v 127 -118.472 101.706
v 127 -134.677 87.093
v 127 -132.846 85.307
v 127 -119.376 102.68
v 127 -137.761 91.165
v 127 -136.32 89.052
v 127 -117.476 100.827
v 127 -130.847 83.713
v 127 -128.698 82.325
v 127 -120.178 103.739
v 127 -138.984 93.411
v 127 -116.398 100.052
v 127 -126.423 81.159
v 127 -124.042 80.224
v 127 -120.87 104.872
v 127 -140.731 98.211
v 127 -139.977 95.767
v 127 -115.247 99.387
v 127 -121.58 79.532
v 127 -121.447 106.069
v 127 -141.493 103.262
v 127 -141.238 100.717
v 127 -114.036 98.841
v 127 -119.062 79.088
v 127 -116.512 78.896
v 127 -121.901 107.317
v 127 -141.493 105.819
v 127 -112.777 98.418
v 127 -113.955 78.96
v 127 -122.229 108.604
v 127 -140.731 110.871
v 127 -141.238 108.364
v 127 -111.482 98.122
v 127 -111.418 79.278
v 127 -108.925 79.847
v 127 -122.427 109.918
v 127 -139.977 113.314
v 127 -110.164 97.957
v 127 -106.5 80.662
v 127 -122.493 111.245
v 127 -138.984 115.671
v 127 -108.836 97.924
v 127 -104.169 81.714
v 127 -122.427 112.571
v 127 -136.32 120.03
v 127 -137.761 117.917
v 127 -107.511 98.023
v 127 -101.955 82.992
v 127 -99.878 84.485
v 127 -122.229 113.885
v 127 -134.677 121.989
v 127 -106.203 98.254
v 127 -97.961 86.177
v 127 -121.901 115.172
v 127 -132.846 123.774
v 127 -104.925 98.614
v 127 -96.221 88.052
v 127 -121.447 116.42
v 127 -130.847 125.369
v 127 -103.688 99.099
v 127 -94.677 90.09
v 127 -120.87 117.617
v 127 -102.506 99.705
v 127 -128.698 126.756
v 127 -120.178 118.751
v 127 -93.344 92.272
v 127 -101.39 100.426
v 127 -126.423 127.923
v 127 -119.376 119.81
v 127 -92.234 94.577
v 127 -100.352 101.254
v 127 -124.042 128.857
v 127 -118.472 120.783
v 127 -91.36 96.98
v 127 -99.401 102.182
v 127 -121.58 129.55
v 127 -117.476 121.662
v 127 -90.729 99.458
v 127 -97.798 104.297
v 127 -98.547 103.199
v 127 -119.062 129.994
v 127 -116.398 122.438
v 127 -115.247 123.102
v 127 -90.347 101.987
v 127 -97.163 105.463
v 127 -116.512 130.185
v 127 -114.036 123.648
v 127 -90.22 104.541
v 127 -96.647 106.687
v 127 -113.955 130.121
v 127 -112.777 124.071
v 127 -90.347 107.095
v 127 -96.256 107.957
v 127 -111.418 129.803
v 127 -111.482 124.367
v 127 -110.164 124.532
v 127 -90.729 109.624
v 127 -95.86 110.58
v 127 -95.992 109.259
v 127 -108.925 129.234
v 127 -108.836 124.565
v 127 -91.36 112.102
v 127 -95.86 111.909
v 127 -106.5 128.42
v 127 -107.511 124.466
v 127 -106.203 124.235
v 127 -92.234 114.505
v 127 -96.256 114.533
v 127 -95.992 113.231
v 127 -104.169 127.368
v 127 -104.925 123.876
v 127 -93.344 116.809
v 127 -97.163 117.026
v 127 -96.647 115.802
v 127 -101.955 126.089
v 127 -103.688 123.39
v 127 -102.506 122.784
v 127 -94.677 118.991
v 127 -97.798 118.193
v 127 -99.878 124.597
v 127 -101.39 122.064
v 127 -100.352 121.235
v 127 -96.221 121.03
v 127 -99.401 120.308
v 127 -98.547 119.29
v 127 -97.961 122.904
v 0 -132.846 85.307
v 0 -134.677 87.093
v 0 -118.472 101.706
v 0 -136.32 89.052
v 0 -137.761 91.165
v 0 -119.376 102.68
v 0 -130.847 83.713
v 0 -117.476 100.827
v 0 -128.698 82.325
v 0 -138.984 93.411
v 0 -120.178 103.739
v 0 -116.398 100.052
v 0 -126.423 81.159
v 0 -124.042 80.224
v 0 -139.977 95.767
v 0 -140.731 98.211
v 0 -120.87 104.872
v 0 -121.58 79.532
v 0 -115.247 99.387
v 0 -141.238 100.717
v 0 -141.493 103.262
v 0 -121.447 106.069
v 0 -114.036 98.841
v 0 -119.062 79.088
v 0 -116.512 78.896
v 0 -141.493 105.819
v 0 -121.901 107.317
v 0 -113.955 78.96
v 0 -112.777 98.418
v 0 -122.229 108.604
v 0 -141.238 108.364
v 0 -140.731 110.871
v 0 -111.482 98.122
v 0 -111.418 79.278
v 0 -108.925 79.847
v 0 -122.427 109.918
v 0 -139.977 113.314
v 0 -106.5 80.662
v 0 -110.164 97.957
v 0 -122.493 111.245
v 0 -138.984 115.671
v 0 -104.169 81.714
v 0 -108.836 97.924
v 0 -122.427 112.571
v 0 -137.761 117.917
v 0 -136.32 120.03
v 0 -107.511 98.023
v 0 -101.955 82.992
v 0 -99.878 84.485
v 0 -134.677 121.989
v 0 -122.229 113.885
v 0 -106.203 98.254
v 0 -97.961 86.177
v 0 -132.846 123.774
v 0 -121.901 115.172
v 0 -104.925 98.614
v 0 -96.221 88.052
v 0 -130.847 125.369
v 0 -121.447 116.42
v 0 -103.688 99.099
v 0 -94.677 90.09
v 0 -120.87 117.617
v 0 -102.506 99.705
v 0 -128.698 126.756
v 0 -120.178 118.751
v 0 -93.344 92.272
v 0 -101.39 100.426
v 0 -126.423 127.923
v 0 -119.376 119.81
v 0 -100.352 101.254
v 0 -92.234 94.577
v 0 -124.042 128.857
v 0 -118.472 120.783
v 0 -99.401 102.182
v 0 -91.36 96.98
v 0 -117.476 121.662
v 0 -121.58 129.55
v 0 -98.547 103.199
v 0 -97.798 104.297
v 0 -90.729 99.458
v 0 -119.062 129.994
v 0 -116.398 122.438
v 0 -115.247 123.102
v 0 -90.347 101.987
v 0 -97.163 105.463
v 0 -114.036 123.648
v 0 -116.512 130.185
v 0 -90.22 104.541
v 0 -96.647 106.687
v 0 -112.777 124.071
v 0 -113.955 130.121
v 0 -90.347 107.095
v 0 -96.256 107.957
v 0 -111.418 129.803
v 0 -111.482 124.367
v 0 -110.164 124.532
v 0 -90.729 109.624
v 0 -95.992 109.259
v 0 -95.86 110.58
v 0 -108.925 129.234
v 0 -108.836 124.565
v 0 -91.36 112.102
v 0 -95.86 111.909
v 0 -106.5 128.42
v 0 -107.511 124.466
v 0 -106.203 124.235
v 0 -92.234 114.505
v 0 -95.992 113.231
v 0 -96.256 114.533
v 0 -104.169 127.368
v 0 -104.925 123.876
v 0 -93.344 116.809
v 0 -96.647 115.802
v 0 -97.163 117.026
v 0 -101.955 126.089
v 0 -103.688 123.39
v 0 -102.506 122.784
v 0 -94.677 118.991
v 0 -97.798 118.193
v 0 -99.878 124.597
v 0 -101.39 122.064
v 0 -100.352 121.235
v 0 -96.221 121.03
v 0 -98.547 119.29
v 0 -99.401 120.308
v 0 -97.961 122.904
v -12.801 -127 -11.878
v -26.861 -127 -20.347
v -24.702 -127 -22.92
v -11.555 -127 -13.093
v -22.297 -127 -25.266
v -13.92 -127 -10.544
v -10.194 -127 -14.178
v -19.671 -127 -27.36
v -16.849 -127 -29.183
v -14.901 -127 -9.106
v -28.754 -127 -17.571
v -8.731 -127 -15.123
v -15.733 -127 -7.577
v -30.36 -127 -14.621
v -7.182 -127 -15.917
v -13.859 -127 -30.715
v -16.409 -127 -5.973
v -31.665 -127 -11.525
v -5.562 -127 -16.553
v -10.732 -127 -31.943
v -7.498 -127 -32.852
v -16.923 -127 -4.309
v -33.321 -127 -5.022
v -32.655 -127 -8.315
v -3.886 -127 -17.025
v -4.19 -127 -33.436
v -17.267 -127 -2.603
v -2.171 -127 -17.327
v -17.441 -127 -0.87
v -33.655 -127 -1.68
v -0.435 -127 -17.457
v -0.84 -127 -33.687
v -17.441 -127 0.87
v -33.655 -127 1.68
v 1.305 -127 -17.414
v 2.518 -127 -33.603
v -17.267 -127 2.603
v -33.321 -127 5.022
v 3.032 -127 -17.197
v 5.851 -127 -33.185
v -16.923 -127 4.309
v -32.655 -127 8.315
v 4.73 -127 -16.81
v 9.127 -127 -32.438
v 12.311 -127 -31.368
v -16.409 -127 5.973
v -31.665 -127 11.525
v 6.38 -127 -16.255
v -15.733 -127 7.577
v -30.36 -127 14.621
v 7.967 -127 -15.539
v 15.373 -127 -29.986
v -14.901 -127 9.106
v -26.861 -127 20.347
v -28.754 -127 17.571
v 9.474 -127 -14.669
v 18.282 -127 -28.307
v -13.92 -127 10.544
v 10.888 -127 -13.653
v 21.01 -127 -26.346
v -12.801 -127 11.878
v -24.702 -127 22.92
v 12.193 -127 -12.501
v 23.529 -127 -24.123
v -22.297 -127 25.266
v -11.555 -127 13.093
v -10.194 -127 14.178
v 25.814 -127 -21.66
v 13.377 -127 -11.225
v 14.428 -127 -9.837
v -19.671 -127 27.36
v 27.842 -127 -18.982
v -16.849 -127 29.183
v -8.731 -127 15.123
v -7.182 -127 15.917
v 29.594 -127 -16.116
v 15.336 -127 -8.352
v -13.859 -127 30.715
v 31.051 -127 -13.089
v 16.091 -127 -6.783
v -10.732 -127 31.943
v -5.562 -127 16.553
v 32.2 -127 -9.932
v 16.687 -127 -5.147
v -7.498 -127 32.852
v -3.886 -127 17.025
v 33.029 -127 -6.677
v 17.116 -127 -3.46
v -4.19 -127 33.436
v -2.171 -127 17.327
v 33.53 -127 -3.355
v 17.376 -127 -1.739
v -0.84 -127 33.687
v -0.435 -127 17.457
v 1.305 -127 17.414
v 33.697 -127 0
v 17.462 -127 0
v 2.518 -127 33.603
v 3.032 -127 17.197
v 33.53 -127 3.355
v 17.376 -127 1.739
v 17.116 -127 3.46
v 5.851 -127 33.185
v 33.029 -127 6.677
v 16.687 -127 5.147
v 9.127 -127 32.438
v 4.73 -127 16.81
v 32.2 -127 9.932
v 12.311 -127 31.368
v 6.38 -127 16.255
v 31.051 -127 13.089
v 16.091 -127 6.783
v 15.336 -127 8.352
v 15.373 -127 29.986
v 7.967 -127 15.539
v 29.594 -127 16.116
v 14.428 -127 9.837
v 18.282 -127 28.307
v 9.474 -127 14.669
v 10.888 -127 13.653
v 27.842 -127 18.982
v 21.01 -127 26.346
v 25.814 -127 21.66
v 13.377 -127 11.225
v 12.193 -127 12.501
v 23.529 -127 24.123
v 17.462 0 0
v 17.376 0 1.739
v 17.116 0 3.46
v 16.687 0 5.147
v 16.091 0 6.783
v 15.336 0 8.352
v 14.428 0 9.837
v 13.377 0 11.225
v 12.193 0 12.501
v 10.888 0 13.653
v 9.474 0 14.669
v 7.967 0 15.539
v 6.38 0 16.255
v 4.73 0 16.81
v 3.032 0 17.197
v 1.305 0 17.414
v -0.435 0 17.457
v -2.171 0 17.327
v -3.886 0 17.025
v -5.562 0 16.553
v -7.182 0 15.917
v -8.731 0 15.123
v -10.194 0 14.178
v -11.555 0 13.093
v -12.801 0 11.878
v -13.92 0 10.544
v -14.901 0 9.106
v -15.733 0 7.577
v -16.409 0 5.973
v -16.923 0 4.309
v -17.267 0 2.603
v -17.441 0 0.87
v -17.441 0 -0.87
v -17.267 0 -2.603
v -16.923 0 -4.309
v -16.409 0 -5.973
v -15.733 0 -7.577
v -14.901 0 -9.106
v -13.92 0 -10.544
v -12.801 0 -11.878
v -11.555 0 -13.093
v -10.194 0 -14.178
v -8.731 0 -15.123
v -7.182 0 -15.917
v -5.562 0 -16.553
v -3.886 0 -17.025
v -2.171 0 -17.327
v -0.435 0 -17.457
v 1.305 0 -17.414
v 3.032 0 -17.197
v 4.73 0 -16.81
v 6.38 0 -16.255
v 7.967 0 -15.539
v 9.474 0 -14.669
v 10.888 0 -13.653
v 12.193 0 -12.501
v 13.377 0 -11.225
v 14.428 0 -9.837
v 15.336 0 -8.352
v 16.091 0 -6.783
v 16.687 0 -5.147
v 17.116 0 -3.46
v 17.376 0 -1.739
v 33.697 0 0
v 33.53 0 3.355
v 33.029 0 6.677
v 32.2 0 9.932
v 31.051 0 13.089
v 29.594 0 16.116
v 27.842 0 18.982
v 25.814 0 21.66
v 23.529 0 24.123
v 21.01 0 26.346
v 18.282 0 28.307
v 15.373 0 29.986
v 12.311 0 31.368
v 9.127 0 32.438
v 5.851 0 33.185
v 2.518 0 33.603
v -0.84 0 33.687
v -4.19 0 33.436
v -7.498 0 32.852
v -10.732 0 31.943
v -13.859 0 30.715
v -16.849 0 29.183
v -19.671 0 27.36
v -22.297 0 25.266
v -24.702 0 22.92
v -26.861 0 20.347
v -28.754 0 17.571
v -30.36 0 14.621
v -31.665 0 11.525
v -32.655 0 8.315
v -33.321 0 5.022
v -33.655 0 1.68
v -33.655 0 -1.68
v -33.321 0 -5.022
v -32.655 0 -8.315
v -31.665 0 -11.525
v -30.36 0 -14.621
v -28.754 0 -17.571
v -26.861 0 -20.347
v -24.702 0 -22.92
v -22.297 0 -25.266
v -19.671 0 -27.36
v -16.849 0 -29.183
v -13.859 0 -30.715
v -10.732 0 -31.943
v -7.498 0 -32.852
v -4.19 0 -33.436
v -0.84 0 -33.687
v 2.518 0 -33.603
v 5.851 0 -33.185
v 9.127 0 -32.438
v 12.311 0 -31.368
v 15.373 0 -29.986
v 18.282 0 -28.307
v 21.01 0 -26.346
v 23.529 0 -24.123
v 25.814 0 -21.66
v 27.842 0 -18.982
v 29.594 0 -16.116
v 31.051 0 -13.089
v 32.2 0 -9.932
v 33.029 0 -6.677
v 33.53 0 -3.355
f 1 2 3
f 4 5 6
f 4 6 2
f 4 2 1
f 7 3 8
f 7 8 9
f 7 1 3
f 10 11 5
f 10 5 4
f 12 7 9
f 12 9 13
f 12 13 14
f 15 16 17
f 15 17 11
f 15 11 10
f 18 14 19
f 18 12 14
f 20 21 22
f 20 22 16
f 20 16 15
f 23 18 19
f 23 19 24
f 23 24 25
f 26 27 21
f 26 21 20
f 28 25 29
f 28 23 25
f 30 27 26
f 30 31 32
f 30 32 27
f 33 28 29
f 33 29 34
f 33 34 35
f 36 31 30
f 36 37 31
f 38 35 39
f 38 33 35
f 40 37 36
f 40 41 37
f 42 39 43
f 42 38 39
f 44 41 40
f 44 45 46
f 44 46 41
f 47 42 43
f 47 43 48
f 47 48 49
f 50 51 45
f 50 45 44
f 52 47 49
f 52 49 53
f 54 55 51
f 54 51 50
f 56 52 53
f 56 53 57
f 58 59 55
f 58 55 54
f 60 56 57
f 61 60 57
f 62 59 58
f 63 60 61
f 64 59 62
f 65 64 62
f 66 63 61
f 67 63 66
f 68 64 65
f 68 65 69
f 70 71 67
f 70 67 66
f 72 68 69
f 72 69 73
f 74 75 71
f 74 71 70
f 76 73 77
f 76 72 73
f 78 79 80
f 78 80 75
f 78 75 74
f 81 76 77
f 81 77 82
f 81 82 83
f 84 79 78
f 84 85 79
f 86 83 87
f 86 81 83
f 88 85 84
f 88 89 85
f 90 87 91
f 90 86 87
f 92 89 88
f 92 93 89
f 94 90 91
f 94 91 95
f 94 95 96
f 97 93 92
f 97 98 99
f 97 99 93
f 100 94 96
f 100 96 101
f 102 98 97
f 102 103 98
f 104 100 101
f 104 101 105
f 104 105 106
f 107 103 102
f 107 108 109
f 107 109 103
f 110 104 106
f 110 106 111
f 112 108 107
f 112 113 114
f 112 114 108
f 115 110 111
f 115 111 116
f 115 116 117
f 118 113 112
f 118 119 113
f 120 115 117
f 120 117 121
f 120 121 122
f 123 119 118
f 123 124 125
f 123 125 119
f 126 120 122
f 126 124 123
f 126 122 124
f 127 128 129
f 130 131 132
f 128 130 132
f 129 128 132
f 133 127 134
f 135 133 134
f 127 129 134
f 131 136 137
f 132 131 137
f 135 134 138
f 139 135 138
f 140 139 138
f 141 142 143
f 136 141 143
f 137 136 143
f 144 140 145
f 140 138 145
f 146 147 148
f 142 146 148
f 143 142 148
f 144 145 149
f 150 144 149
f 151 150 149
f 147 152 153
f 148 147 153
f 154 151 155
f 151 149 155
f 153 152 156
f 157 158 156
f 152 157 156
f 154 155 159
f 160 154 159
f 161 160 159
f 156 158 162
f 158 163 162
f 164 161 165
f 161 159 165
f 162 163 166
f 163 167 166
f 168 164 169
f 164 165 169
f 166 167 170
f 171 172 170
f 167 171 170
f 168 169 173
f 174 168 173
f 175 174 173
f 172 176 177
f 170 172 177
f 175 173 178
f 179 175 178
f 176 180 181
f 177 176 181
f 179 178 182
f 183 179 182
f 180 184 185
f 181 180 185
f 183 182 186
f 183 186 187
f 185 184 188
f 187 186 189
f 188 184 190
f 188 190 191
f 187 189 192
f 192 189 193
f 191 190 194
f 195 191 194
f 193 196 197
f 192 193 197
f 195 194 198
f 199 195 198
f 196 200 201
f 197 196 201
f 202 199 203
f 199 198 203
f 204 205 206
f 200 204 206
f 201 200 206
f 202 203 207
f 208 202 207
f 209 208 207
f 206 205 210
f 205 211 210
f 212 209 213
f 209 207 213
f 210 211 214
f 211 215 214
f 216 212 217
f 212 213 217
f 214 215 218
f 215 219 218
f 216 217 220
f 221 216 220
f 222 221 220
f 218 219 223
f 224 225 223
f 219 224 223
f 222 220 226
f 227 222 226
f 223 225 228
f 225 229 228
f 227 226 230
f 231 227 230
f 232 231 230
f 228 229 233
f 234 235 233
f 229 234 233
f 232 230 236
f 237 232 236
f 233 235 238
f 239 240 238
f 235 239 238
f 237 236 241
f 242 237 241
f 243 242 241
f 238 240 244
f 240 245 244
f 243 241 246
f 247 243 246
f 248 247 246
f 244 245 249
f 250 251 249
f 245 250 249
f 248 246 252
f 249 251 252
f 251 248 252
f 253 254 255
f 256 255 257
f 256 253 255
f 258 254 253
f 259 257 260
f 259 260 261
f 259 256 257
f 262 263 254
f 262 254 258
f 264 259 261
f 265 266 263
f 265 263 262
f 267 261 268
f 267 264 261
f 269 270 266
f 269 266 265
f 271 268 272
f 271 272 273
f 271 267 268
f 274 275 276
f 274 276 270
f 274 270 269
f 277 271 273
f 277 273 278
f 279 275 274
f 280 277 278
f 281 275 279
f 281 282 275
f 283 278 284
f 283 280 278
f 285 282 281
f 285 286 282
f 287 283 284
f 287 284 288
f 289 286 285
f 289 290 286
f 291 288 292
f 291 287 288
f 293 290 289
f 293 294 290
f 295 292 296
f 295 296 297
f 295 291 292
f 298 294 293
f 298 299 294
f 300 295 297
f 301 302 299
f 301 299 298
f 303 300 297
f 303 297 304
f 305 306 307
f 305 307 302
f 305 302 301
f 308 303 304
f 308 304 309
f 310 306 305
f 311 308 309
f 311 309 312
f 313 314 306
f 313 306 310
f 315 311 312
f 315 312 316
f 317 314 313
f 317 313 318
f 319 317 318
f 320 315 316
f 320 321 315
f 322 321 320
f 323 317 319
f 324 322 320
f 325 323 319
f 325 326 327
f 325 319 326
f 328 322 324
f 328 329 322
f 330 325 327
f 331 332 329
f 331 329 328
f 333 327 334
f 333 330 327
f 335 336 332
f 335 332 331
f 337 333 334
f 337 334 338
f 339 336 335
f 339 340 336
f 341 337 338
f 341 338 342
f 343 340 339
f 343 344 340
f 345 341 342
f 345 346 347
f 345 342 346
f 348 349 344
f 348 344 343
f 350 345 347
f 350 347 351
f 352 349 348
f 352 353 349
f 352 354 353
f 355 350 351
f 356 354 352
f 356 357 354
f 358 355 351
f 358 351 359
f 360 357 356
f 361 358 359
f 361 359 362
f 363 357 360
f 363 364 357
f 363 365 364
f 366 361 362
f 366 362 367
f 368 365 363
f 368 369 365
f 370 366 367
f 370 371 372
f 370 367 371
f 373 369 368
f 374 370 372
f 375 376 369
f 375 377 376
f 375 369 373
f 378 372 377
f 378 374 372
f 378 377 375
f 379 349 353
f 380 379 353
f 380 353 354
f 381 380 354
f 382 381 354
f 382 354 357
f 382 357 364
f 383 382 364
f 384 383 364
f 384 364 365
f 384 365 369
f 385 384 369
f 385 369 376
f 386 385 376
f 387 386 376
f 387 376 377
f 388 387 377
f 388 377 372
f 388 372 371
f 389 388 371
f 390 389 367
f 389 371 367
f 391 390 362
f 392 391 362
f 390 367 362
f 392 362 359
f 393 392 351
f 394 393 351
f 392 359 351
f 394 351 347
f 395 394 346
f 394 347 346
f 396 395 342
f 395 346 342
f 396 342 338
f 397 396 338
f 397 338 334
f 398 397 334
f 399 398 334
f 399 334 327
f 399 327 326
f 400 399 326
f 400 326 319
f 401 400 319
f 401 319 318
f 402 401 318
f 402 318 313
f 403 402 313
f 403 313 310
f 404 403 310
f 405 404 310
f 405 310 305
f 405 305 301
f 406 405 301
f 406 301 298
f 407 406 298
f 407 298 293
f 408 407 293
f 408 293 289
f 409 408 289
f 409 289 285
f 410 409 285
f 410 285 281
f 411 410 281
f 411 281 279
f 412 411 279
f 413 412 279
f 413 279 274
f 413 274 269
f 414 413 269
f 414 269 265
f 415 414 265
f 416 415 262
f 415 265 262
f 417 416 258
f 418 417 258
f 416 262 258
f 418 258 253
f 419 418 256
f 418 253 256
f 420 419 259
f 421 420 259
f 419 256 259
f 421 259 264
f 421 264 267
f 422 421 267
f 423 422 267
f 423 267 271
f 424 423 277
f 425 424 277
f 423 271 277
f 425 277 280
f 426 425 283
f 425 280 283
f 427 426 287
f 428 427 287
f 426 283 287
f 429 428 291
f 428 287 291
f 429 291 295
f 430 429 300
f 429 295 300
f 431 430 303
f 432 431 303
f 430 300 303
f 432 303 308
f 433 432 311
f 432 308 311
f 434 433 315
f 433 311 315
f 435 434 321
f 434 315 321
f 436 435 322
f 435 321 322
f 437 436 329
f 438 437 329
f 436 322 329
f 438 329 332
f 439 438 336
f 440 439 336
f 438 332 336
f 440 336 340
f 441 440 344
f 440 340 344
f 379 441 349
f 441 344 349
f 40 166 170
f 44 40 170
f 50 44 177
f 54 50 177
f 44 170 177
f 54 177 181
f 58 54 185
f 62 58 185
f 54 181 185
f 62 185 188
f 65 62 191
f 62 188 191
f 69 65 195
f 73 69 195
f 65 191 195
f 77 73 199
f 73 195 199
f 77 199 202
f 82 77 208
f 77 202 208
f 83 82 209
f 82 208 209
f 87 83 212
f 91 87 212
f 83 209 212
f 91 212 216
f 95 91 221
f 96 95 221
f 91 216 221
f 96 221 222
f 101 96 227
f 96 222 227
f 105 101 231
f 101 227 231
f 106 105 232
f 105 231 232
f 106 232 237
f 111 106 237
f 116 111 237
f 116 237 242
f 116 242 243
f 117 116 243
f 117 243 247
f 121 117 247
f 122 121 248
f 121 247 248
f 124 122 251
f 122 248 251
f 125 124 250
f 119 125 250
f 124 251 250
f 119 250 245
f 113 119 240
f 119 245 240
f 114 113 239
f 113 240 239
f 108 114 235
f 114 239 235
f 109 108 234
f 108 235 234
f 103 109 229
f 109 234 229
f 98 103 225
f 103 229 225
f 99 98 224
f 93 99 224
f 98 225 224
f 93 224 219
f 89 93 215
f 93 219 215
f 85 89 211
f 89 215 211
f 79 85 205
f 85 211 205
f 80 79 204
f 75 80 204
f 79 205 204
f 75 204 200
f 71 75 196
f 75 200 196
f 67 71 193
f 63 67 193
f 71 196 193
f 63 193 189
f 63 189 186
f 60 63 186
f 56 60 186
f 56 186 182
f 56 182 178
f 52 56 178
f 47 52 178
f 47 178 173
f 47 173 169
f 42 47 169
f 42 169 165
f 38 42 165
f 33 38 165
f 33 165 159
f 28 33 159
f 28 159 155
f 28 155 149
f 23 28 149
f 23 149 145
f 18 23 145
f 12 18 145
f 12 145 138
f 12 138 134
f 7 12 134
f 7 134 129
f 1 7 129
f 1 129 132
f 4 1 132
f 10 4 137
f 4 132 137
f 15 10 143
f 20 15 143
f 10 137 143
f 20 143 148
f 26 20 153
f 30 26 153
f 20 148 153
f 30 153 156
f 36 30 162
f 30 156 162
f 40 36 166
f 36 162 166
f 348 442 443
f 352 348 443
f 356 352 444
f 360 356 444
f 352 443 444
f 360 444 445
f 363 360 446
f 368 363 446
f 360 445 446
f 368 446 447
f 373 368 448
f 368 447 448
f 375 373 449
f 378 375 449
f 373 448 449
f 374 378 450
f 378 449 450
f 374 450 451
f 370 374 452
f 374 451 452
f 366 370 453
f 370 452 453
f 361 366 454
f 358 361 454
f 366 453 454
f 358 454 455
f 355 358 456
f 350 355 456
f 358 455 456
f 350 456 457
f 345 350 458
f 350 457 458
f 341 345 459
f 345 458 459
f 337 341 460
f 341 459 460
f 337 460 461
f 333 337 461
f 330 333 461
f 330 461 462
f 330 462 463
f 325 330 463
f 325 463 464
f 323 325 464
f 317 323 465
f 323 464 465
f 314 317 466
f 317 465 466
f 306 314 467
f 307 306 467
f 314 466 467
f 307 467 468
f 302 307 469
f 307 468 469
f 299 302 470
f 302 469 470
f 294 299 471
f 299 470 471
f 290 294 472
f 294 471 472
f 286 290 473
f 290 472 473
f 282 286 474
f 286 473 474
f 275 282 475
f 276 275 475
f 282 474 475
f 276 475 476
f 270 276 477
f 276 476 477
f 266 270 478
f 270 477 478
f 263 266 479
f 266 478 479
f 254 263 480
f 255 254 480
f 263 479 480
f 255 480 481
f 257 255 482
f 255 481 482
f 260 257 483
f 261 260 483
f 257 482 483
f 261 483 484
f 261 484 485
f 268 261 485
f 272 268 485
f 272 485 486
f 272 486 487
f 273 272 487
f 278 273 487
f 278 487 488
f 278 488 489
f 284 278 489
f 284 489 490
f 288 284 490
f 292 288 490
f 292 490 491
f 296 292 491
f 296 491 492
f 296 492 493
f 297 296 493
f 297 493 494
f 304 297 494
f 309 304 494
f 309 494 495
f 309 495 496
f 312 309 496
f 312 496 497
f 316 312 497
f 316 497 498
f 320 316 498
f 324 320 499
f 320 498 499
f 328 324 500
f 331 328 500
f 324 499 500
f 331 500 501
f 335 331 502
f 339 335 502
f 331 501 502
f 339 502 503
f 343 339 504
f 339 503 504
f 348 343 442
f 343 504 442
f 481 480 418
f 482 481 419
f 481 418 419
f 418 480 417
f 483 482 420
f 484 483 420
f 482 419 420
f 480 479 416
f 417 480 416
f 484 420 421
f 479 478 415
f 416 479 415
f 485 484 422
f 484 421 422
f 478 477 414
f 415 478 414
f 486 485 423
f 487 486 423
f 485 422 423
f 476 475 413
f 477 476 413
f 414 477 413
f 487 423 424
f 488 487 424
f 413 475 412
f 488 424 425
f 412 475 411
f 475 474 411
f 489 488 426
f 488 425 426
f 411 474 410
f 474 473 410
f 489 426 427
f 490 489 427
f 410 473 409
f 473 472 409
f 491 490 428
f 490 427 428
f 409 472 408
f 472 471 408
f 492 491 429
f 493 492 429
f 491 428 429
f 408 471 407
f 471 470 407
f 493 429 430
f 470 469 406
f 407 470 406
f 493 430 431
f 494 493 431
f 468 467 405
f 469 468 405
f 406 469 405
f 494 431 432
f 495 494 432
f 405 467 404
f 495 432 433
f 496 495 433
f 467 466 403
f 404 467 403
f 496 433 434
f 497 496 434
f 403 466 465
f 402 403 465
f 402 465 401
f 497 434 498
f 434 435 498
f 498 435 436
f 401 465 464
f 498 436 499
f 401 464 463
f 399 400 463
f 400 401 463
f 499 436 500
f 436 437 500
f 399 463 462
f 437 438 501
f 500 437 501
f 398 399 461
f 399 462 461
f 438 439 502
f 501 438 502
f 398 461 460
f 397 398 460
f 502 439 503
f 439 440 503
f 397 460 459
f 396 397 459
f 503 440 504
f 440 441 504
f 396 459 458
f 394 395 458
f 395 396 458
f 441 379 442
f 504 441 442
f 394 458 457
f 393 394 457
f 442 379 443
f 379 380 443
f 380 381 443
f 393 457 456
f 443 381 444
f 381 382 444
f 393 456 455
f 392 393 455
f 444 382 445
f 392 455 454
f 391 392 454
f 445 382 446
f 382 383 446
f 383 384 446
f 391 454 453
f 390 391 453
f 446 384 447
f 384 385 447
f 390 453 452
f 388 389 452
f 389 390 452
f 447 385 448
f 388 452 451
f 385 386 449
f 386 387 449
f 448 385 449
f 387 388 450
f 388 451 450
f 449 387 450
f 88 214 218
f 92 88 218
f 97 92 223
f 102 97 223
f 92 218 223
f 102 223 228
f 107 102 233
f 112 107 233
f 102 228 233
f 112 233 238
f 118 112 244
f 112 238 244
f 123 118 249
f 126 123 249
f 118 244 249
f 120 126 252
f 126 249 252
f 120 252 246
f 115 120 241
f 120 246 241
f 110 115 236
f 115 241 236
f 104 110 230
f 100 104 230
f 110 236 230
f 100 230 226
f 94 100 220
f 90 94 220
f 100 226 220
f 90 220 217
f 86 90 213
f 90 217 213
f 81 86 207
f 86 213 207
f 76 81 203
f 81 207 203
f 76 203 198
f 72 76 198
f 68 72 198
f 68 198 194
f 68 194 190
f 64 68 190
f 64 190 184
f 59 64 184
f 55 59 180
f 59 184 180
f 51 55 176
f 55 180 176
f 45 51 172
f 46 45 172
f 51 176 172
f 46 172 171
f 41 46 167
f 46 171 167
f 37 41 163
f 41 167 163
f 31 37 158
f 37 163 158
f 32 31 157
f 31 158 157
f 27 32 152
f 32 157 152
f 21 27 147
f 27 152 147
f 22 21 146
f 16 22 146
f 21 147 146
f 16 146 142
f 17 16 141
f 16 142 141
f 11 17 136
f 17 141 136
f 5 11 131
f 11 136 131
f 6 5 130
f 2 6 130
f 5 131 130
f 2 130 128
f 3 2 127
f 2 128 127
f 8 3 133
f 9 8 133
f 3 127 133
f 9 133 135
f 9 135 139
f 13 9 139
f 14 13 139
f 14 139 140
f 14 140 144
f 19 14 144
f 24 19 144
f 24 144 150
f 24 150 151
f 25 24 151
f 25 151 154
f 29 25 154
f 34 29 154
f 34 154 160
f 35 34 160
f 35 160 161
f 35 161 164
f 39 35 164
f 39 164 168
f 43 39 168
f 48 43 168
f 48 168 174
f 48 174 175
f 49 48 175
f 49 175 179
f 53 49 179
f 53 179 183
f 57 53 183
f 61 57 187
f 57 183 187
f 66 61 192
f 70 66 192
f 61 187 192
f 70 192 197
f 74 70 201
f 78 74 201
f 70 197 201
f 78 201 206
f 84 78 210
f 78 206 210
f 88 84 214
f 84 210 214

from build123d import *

# Parameters (mm, degrees)
F0_R     = 33.697277
F1_DEPTH = 127
F2_R     = 17.4625
F3_DEPTH = 146.304
F4_R     = 25.652276
F5_DEPTH = 127
F6_R     = 13.324732
F7_DEPTH = 127


with BuildPart() as f1:
    # F0 (on Front) → F1 (new body)
    with BuildSketch(Plane.XZ):
        Circle(F0_R)
    extrude(amount=F1_DEPTH)

    # F2 (on face) → F3 (cut)
    with BuildSketch(Plane.XZ.offset(127)):
        Circle(F2_R)
    extrude(amount=-F3_DEPTH, mode=Mode.SUBTRACT)


with BuildPart() as f5:
    # F4 (on Right) → F5 (new body)
    with BuildSketch(Plane.YZ):
        with Locations((-115.872189, 104.540773)):
            Circle(F4_R)
    extrude(amount=F5_DEPTH)

    # F6 (on face) → F7 (cut)
    with BuildSketch(Plane(origin=(0, 0, 0), x_dir=(0, -1, 0), z_dir=(-1, 0, 0))):
        with Locations((109.168321, 111.244656)):
            Circle(F6_R)
    extrude(amount=-F7_DEPTH, mode=Mode.SUBTRACT)


solid = Compound([f1.part, f5.part])
